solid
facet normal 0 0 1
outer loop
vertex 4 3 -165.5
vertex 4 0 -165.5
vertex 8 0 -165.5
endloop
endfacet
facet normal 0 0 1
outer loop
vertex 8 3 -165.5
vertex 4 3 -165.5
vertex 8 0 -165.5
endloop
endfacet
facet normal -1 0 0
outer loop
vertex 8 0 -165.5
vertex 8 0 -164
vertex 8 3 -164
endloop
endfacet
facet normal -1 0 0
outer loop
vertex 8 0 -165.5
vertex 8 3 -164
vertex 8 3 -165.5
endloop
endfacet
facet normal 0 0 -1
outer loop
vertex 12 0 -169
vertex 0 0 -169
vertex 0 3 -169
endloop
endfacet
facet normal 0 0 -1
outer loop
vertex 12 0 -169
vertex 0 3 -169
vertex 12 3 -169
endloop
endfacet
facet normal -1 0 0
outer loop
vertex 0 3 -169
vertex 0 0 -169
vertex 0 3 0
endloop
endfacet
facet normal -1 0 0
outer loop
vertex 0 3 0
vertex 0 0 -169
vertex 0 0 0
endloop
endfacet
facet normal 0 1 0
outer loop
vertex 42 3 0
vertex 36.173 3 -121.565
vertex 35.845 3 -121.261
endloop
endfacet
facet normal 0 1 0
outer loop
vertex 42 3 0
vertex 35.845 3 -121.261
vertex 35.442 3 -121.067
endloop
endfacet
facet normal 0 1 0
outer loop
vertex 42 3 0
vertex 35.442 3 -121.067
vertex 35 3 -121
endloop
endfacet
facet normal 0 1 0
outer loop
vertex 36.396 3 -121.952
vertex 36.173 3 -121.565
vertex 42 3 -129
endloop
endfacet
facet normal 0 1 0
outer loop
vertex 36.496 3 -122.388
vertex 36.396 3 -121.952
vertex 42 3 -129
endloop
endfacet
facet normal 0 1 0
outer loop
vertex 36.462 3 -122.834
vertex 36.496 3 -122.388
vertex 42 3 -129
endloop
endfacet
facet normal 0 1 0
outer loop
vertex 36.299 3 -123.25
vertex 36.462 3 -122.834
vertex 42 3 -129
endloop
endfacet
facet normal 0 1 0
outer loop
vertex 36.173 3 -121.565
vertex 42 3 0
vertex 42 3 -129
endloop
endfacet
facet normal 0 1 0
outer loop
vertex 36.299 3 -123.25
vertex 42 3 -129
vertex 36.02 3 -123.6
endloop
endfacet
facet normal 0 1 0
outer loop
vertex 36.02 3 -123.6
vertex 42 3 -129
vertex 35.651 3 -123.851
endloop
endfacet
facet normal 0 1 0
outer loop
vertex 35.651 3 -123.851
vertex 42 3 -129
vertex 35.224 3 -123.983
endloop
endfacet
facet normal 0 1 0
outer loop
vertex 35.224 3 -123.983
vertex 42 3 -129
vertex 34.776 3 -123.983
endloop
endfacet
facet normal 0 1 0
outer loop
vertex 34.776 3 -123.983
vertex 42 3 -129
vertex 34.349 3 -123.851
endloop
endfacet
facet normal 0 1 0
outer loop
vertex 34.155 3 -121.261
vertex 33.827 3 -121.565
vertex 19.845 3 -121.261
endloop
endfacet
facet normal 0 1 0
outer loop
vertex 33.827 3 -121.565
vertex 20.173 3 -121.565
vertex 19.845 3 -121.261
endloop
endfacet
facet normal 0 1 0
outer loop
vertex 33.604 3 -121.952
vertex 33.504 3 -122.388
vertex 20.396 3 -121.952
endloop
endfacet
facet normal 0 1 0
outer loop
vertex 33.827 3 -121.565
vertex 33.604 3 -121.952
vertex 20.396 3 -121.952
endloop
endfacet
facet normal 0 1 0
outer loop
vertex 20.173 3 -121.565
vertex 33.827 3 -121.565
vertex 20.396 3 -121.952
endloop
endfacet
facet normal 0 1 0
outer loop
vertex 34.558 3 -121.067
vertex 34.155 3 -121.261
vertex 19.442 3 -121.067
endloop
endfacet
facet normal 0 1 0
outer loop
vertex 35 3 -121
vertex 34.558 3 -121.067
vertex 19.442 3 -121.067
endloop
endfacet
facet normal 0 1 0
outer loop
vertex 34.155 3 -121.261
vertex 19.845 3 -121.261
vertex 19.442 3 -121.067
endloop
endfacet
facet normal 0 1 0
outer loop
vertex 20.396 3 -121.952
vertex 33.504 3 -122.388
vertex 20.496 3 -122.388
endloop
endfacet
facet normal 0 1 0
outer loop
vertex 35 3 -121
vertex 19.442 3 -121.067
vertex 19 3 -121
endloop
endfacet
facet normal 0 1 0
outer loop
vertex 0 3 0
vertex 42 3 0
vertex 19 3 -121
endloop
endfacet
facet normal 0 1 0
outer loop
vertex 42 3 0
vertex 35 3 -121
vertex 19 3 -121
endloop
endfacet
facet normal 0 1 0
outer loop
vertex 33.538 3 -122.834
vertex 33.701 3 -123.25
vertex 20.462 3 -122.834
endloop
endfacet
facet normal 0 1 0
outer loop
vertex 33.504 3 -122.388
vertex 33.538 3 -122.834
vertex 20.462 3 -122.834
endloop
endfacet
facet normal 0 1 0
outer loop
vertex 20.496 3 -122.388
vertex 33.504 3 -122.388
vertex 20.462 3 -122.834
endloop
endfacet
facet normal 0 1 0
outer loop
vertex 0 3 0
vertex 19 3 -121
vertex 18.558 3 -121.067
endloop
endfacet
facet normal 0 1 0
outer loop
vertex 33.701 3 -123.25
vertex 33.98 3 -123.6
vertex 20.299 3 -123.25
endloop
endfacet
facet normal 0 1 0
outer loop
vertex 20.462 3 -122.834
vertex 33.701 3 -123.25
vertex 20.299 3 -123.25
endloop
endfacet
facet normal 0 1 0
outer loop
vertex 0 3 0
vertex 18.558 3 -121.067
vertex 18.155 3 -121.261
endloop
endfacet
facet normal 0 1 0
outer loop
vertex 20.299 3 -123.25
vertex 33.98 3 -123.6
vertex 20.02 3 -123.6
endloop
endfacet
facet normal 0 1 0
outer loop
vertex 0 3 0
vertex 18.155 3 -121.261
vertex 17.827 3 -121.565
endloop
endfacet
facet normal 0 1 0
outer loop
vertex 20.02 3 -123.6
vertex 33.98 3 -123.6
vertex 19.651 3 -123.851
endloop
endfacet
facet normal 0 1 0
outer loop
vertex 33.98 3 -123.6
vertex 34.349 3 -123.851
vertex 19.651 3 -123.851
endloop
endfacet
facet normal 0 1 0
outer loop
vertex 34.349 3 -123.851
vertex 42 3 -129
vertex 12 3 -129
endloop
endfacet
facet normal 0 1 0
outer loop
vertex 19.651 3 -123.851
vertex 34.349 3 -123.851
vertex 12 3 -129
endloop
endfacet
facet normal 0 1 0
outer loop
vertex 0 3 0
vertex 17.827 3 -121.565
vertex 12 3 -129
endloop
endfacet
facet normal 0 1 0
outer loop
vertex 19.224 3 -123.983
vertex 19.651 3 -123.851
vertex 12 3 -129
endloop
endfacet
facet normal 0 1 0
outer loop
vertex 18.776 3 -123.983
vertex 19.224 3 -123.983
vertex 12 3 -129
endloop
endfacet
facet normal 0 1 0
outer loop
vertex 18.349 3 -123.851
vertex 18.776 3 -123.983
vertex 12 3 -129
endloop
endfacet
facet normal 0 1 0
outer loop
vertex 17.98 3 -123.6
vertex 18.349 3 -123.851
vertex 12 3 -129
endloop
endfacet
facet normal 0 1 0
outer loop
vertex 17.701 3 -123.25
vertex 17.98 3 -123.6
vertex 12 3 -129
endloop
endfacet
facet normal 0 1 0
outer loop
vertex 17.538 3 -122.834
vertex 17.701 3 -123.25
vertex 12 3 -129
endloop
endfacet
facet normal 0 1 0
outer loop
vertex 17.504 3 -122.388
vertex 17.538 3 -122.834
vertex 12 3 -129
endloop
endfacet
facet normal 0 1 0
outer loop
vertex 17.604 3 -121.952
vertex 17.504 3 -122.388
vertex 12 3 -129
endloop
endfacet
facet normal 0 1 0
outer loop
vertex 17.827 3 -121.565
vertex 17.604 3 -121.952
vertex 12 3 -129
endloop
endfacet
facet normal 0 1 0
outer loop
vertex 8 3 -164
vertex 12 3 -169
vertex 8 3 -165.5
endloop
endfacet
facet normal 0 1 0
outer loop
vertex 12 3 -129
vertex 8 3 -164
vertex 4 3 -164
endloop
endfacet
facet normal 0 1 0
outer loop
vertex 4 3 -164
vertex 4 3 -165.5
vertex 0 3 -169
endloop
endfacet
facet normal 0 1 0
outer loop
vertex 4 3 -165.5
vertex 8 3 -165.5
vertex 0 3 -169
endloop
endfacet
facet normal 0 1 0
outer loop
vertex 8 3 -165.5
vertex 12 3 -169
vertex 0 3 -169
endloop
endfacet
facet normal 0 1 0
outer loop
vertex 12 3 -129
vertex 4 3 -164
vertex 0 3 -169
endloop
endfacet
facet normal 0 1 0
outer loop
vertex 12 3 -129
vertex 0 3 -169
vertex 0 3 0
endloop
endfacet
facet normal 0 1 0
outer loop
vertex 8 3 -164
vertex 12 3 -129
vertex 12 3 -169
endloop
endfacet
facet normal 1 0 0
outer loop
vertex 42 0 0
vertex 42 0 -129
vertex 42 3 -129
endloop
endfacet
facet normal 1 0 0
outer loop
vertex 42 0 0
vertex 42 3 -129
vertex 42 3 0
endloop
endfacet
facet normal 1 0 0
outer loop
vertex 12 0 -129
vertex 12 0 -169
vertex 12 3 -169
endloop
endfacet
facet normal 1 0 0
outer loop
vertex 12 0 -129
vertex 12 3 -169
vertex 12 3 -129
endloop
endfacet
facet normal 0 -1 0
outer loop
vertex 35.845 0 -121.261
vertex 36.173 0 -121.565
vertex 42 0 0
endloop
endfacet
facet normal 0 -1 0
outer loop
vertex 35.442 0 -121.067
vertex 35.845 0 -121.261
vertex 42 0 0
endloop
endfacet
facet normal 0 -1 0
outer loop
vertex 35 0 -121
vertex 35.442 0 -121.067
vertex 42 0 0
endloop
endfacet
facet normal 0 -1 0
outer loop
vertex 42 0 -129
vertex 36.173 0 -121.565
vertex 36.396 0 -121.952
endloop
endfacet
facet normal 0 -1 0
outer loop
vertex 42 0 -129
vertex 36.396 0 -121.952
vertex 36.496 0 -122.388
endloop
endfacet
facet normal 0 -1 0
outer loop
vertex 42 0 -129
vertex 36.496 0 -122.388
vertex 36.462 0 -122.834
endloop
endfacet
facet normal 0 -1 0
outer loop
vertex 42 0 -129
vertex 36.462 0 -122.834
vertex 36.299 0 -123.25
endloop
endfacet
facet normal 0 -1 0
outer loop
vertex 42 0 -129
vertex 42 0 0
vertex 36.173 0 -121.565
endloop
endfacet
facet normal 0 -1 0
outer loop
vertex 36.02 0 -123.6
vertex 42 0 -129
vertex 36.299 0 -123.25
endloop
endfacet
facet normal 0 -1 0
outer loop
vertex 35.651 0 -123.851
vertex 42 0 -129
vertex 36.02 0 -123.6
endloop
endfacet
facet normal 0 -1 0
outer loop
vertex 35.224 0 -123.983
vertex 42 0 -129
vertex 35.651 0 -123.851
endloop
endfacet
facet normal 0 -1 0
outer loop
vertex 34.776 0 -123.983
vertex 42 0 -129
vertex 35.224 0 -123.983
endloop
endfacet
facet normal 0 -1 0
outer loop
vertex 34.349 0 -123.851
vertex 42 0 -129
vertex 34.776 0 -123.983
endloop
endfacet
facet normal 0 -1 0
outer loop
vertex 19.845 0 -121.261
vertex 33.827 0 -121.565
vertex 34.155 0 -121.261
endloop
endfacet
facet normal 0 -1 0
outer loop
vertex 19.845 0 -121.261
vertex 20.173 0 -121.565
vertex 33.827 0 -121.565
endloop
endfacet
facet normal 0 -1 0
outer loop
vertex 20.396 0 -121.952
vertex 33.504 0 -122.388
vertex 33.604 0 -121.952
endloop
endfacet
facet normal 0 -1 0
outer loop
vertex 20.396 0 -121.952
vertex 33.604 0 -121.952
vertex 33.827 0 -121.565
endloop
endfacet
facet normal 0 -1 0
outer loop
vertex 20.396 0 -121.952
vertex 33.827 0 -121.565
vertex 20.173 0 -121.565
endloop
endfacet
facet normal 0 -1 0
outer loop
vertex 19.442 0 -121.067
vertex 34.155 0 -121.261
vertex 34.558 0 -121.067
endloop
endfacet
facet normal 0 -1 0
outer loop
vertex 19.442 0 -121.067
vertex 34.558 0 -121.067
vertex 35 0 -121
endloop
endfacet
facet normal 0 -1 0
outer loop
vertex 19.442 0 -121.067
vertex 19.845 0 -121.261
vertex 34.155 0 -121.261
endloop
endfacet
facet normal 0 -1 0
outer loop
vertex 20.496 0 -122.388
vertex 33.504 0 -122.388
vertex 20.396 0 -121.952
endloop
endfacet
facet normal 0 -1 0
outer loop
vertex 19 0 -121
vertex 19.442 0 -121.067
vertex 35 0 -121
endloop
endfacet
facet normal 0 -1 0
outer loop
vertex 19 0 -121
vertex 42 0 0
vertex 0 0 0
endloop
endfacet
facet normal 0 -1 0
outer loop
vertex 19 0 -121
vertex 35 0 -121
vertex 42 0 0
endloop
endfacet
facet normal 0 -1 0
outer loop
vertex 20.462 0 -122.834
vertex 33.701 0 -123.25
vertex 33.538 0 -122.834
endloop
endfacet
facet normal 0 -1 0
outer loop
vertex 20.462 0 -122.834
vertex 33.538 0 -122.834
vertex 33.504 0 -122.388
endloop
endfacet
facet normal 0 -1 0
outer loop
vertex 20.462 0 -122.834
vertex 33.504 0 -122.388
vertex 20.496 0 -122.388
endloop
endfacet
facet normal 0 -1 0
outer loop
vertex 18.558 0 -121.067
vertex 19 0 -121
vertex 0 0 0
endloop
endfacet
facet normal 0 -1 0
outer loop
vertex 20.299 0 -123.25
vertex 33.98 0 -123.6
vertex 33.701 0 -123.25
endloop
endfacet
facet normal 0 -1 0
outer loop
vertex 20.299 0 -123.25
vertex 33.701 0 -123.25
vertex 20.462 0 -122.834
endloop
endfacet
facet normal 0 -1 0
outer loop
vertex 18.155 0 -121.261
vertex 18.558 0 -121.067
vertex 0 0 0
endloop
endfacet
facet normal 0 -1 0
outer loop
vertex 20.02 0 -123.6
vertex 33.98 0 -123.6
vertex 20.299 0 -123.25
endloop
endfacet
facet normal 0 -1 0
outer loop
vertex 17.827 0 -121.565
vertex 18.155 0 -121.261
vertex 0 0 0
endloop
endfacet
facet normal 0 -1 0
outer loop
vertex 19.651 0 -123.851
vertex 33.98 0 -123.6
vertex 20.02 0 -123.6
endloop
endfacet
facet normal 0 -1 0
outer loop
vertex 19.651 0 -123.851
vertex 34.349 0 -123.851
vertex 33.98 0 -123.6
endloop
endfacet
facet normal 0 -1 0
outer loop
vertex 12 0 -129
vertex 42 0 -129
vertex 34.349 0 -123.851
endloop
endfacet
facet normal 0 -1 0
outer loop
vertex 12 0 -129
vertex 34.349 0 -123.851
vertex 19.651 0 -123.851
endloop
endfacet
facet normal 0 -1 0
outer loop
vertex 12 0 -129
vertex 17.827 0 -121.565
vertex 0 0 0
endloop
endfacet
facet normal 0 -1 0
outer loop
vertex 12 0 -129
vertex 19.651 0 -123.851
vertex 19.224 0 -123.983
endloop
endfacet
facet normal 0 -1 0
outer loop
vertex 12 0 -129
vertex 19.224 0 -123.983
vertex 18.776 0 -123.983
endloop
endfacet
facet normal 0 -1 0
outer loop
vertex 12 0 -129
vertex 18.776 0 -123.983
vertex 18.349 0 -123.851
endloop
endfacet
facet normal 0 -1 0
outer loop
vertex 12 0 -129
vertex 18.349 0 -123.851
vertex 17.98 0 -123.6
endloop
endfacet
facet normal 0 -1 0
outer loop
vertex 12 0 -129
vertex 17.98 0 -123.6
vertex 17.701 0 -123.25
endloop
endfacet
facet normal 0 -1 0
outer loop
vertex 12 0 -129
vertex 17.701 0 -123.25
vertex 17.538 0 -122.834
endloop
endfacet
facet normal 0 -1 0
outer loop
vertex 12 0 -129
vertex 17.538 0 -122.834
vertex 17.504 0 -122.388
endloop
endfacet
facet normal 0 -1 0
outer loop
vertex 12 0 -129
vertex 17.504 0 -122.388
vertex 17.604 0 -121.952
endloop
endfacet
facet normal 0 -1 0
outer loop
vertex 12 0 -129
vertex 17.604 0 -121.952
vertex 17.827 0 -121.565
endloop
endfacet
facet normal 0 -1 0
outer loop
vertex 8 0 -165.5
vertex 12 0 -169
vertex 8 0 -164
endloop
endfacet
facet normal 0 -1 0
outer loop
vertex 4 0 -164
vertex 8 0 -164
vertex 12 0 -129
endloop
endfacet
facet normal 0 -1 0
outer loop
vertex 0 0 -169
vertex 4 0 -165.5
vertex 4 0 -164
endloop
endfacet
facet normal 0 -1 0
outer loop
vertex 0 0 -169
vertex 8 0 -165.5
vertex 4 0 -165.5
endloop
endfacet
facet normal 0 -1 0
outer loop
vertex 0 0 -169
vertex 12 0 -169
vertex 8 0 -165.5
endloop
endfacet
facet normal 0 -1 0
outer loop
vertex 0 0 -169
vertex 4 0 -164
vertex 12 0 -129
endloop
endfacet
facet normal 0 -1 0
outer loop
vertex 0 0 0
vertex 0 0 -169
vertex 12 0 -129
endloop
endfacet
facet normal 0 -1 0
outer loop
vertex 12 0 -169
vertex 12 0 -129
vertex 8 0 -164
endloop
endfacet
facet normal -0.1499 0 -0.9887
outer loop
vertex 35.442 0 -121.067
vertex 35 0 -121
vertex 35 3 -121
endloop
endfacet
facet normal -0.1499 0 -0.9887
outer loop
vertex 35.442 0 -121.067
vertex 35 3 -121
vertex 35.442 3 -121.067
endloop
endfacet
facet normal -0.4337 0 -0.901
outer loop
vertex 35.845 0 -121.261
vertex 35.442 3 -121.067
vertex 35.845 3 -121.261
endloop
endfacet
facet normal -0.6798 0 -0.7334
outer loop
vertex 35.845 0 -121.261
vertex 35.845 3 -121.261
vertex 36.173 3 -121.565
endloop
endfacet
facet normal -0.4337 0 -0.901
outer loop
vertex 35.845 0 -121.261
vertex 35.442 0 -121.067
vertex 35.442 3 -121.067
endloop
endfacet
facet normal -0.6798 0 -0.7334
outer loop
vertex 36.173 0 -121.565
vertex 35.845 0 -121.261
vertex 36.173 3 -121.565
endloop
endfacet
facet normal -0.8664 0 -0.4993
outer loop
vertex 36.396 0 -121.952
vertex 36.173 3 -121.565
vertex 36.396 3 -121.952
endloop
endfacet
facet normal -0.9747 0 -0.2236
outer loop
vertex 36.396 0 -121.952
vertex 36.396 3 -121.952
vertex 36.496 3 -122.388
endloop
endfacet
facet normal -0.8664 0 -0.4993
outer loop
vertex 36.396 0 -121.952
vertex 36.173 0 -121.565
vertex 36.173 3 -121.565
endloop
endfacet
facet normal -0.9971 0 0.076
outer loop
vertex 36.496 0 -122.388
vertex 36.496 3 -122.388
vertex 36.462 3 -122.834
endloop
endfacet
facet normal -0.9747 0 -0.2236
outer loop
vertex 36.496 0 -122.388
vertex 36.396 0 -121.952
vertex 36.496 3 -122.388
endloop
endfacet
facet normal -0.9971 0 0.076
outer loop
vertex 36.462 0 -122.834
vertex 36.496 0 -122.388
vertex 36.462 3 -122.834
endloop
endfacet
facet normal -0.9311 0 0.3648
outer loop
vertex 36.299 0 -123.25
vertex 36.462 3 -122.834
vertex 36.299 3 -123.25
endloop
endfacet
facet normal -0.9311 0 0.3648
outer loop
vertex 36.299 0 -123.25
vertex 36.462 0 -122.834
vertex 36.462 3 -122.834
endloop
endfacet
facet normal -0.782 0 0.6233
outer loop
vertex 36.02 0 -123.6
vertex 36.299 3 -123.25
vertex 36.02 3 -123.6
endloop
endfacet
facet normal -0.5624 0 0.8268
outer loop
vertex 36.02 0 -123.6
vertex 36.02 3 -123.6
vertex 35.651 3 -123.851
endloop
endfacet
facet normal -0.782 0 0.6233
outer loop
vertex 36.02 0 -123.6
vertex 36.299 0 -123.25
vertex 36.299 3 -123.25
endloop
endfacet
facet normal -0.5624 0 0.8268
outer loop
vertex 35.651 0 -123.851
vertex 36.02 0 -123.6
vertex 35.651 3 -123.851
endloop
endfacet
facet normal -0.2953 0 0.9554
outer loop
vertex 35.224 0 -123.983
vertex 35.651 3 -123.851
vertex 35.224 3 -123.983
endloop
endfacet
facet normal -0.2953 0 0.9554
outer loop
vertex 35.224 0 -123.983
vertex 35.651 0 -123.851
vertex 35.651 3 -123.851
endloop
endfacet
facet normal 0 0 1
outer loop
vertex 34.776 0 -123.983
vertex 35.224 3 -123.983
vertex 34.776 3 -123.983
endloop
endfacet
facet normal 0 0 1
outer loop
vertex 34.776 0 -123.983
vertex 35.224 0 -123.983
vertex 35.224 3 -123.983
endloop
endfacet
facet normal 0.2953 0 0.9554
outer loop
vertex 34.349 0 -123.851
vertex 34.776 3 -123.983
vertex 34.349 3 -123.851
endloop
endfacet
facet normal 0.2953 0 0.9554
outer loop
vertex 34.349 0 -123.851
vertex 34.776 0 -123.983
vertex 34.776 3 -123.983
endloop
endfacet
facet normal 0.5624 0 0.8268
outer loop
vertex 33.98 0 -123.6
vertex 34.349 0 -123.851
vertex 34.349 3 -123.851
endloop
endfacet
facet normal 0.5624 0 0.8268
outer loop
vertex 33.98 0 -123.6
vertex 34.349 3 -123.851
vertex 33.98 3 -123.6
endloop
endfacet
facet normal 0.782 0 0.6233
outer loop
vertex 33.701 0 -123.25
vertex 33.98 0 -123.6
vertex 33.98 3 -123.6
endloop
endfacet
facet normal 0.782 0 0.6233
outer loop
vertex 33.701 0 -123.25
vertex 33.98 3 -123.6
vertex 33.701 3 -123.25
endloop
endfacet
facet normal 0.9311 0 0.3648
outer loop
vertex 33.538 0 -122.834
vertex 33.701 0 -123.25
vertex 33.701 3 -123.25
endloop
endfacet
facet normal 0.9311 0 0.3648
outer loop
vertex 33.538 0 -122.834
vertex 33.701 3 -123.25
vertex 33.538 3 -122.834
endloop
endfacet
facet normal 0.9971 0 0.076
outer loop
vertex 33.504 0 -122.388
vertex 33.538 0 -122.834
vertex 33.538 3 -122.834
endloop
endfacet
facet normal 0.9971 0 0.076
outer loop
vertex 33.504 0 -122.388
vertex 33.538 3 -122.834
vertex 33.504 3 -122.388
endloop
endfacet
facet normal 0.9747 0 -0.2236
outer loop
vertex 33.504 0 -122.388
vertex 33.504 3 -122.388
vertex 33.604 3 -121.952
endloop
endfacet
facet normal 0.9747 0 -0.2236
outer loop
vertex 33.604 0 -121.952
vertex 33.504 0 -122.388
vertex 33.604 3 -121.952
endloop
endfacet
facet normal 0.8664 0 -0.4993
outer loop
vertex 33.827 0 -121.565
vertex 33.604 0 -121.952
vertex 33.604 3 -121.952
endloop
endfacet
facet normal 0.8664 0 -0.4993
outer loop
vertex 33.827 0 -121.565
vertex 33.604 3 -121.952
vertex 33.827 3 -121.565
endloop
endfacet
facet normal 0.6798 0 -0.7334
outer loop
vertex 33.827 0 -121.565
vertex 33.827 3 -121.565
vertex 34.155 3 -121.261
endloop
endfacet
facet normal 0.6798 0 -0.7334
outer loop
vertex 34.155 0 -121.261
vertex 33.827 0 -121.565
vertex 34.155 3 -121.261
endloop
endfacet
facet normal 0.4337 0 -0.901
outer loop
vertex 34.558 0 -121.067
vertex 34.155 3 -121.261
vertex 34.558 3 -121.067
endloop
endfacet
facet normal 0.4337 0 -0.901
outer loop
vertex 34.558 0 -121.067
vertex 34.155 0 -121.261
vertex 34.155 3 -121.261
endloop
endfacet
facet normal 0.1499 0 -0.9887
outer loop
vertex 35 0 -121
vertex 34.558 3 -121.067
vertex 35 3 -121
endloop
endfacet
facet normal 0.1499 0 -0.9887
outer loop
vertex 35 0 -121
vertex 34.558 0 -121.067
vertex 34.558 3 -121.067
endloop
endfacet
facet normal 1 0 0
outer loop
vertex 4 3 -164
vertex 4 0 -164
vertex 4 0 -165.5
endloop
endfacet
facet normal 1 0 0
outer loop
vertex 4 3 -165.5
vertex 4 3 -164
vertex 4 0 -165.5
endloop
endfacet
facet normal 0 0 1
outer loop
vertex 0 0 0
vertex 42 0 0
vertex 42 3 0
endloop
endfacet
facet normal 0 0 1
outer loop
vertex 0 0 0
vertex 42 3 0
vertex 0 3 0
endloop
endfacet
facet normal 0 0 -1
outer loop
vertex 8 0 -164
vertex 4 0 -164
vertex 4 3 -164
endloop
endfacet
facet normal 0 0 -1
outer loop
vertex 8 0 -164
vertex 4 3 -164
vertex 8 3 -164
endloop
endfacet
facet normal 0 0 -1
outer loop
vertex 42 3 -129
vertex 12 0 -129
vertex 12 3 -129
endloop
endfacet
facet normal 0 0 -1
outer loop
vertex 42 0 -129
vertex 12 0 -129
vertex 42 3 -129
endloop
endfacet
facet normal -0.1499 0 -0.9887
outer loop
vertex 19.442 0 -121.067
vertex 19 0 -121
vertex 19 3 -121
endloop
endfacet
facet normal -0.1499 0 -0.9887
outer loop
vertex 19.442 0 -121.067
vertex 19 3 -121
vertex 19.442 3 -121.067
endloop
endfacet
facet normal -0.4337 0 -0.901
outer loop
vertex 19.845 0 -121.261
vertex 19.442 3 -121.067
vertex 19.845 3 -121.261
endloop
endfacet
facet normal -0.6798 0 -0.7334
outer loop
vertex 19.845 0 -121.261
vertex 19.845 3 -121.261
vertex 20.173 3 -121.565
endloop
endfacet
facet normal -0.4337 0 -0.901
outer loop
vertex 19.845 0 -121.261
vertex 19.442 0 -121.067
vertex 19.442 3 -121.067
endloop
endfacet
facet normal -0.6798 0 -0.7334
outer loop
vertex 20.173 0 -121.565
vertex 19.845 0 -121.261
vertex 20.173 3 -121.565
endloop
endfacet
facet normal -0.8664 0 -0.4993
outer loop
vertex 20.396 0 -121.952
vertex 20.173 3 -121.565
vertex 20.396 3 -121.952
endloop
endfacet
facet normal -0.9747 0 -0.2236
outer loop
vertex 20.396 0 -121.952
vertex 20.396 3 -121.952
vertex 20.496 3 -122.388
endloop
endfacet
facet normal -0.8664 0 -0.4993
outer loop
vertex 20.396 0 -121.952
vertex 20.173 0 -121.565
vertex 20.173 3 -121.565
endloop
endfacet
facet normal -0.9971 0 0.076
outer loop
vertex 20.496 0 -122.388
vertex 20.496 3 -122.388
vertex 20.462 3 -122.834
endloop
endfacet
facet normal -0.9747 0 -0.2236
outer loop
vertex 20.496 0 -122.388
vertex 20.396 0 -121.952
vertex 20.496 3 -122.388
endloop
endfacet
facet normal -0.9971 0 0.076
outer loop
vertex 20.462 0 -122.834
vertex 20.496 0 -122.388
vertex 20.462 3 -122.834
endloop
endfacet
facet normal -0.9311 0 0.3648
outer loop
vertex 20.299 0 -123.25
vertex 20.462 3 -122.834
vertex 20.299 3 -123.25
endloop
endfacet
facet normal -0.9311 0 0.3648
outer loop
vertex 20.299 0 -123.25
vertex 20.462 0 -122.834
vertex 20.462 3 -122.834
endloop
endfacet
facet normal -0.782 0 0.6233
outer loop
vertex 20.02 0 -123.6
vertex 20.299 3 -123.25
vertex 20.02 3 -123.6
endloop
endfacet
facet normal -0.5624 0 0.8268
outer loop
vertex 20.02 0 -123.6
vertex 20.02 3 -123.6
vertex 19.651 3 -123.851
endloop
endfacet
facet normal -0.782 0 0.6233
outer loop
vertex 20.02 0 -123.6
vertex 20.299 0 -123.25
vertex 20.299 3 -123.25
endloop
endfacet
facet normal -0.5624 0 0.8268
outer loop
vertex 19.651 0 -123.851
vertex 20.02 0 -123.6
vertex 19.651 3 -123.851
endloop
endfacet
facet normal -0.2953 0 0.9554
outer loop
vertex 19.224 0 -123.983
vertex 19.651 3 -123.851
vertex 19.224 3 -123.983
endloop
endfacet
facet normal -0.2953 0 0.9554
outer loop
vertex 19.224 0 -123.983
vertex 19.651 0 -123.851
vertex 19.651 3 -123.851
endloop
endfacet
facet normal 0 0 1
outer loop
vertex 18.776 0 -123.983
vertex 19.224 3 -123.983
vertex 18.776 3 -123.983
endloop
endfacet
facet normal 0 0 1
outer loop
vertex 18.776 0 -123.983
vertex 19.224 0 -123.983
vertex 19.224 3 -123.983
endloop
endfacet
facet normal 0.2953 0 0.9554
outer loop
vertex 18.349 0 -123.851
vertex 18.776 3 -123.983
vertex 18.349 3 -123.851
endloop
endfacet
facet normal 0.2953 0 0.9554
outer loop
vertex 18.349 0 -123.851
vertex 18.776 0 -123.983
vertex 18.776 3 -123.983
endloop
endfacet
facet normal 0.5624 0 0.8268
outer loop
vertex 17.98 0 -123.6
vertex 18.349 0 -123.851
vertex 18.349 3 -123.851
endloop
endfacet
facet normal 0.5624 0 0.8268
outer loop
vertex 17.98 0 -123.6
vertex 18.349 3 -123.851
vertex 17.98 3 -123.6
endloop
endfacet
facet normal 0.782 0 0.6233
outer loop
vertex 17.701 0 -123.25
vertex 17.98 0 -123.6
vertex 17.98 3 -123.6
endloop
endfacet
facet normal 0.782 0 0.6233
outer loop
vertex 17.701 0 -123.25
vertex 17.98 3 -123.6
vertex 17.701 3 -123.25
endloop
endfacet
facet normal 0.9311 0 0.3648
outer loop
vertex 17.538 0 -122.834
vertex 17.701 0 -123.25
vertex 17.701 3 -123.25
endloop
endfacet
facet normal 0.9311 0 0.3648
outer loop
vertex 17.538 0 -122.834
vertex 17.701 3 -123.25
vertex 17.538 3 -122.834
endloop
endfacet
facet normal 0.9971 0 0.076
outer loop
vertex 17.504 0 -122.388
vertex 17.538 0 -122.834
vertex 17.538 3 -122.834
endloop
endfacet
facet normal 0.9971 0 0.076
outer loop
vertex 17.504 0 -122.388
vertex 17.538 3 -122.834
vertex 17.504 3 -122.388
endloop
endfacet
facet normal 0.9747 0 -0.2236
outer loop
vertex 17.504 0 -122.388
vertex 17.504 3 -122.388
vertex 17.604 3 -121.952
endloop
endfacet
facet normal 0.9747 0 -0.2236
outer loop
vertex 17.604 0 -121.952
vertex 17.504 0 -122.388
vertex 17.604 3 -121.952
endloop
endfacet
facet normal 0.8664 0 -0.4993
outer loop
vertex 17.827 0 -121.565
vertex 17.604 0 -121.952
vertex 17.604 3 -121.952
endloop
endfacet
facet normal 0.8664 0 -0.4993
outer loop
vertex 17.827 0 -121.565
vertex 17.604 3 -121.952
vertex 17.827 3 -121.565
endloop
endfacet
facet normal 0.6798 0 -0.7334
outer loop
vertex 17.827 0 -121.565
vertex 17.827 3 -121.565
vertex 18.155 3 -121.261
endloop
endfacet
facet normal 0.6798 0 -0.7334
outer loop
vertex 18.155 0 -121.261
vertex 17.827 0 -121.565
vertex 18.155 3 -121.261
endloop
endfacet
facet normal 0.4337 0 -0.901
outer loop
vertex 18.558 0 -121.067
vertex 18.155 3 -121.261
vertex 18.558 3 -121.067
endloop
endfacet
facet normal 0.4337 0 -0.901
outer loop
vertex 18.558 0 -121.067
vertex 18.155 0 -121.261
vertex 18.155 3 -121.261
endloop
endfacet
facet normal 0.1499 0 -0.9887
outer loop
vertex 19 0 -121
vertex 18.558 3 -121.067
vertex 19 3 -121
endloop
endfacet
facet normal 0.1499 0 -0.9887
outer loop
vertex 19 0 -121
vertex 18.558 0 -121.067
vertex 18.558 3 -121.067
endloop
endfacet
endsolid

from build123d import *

# Parameters (mm, degrees)
SKETCH1_R           = 1.5
SKETCH1_W           = 4
SKETCH1_H           = 1.5
BOSS_EXTRUDE1_DEPTH = 3


with BuildPart() as part:
    # Sketch1 → Boss-Extrude1 (new body)
    with BuildSketch(Plane(origin=(0, 0, 0), x_dir=(1, 0, 0), z_dir=(0, 1, 0))):
        Polygon((0, 129), (0, 169), (12, 169), (12, 129), (42, 129), (42, 0), (0, 0), align=None)
        with Locations(Location((19, 122.5, 0), (0, 0, 270))):
            Circle(SKETCH1_R, mode=Mode.SUBTRACT)
        with Locations(Location((35, 122.5, 0), (0, 0, 270))):
            Circle(SKETCH1_R, mode=Mode.SUBTRACT)
        with Locations((6, 164.75)):
            Rectangle(SKETCH1_W, SKETCH1_H, mode=Mode.SUBTRACT)
    extrude(amount=BOSS_EXTRUDE1_DEPTH)


solid = part.part
